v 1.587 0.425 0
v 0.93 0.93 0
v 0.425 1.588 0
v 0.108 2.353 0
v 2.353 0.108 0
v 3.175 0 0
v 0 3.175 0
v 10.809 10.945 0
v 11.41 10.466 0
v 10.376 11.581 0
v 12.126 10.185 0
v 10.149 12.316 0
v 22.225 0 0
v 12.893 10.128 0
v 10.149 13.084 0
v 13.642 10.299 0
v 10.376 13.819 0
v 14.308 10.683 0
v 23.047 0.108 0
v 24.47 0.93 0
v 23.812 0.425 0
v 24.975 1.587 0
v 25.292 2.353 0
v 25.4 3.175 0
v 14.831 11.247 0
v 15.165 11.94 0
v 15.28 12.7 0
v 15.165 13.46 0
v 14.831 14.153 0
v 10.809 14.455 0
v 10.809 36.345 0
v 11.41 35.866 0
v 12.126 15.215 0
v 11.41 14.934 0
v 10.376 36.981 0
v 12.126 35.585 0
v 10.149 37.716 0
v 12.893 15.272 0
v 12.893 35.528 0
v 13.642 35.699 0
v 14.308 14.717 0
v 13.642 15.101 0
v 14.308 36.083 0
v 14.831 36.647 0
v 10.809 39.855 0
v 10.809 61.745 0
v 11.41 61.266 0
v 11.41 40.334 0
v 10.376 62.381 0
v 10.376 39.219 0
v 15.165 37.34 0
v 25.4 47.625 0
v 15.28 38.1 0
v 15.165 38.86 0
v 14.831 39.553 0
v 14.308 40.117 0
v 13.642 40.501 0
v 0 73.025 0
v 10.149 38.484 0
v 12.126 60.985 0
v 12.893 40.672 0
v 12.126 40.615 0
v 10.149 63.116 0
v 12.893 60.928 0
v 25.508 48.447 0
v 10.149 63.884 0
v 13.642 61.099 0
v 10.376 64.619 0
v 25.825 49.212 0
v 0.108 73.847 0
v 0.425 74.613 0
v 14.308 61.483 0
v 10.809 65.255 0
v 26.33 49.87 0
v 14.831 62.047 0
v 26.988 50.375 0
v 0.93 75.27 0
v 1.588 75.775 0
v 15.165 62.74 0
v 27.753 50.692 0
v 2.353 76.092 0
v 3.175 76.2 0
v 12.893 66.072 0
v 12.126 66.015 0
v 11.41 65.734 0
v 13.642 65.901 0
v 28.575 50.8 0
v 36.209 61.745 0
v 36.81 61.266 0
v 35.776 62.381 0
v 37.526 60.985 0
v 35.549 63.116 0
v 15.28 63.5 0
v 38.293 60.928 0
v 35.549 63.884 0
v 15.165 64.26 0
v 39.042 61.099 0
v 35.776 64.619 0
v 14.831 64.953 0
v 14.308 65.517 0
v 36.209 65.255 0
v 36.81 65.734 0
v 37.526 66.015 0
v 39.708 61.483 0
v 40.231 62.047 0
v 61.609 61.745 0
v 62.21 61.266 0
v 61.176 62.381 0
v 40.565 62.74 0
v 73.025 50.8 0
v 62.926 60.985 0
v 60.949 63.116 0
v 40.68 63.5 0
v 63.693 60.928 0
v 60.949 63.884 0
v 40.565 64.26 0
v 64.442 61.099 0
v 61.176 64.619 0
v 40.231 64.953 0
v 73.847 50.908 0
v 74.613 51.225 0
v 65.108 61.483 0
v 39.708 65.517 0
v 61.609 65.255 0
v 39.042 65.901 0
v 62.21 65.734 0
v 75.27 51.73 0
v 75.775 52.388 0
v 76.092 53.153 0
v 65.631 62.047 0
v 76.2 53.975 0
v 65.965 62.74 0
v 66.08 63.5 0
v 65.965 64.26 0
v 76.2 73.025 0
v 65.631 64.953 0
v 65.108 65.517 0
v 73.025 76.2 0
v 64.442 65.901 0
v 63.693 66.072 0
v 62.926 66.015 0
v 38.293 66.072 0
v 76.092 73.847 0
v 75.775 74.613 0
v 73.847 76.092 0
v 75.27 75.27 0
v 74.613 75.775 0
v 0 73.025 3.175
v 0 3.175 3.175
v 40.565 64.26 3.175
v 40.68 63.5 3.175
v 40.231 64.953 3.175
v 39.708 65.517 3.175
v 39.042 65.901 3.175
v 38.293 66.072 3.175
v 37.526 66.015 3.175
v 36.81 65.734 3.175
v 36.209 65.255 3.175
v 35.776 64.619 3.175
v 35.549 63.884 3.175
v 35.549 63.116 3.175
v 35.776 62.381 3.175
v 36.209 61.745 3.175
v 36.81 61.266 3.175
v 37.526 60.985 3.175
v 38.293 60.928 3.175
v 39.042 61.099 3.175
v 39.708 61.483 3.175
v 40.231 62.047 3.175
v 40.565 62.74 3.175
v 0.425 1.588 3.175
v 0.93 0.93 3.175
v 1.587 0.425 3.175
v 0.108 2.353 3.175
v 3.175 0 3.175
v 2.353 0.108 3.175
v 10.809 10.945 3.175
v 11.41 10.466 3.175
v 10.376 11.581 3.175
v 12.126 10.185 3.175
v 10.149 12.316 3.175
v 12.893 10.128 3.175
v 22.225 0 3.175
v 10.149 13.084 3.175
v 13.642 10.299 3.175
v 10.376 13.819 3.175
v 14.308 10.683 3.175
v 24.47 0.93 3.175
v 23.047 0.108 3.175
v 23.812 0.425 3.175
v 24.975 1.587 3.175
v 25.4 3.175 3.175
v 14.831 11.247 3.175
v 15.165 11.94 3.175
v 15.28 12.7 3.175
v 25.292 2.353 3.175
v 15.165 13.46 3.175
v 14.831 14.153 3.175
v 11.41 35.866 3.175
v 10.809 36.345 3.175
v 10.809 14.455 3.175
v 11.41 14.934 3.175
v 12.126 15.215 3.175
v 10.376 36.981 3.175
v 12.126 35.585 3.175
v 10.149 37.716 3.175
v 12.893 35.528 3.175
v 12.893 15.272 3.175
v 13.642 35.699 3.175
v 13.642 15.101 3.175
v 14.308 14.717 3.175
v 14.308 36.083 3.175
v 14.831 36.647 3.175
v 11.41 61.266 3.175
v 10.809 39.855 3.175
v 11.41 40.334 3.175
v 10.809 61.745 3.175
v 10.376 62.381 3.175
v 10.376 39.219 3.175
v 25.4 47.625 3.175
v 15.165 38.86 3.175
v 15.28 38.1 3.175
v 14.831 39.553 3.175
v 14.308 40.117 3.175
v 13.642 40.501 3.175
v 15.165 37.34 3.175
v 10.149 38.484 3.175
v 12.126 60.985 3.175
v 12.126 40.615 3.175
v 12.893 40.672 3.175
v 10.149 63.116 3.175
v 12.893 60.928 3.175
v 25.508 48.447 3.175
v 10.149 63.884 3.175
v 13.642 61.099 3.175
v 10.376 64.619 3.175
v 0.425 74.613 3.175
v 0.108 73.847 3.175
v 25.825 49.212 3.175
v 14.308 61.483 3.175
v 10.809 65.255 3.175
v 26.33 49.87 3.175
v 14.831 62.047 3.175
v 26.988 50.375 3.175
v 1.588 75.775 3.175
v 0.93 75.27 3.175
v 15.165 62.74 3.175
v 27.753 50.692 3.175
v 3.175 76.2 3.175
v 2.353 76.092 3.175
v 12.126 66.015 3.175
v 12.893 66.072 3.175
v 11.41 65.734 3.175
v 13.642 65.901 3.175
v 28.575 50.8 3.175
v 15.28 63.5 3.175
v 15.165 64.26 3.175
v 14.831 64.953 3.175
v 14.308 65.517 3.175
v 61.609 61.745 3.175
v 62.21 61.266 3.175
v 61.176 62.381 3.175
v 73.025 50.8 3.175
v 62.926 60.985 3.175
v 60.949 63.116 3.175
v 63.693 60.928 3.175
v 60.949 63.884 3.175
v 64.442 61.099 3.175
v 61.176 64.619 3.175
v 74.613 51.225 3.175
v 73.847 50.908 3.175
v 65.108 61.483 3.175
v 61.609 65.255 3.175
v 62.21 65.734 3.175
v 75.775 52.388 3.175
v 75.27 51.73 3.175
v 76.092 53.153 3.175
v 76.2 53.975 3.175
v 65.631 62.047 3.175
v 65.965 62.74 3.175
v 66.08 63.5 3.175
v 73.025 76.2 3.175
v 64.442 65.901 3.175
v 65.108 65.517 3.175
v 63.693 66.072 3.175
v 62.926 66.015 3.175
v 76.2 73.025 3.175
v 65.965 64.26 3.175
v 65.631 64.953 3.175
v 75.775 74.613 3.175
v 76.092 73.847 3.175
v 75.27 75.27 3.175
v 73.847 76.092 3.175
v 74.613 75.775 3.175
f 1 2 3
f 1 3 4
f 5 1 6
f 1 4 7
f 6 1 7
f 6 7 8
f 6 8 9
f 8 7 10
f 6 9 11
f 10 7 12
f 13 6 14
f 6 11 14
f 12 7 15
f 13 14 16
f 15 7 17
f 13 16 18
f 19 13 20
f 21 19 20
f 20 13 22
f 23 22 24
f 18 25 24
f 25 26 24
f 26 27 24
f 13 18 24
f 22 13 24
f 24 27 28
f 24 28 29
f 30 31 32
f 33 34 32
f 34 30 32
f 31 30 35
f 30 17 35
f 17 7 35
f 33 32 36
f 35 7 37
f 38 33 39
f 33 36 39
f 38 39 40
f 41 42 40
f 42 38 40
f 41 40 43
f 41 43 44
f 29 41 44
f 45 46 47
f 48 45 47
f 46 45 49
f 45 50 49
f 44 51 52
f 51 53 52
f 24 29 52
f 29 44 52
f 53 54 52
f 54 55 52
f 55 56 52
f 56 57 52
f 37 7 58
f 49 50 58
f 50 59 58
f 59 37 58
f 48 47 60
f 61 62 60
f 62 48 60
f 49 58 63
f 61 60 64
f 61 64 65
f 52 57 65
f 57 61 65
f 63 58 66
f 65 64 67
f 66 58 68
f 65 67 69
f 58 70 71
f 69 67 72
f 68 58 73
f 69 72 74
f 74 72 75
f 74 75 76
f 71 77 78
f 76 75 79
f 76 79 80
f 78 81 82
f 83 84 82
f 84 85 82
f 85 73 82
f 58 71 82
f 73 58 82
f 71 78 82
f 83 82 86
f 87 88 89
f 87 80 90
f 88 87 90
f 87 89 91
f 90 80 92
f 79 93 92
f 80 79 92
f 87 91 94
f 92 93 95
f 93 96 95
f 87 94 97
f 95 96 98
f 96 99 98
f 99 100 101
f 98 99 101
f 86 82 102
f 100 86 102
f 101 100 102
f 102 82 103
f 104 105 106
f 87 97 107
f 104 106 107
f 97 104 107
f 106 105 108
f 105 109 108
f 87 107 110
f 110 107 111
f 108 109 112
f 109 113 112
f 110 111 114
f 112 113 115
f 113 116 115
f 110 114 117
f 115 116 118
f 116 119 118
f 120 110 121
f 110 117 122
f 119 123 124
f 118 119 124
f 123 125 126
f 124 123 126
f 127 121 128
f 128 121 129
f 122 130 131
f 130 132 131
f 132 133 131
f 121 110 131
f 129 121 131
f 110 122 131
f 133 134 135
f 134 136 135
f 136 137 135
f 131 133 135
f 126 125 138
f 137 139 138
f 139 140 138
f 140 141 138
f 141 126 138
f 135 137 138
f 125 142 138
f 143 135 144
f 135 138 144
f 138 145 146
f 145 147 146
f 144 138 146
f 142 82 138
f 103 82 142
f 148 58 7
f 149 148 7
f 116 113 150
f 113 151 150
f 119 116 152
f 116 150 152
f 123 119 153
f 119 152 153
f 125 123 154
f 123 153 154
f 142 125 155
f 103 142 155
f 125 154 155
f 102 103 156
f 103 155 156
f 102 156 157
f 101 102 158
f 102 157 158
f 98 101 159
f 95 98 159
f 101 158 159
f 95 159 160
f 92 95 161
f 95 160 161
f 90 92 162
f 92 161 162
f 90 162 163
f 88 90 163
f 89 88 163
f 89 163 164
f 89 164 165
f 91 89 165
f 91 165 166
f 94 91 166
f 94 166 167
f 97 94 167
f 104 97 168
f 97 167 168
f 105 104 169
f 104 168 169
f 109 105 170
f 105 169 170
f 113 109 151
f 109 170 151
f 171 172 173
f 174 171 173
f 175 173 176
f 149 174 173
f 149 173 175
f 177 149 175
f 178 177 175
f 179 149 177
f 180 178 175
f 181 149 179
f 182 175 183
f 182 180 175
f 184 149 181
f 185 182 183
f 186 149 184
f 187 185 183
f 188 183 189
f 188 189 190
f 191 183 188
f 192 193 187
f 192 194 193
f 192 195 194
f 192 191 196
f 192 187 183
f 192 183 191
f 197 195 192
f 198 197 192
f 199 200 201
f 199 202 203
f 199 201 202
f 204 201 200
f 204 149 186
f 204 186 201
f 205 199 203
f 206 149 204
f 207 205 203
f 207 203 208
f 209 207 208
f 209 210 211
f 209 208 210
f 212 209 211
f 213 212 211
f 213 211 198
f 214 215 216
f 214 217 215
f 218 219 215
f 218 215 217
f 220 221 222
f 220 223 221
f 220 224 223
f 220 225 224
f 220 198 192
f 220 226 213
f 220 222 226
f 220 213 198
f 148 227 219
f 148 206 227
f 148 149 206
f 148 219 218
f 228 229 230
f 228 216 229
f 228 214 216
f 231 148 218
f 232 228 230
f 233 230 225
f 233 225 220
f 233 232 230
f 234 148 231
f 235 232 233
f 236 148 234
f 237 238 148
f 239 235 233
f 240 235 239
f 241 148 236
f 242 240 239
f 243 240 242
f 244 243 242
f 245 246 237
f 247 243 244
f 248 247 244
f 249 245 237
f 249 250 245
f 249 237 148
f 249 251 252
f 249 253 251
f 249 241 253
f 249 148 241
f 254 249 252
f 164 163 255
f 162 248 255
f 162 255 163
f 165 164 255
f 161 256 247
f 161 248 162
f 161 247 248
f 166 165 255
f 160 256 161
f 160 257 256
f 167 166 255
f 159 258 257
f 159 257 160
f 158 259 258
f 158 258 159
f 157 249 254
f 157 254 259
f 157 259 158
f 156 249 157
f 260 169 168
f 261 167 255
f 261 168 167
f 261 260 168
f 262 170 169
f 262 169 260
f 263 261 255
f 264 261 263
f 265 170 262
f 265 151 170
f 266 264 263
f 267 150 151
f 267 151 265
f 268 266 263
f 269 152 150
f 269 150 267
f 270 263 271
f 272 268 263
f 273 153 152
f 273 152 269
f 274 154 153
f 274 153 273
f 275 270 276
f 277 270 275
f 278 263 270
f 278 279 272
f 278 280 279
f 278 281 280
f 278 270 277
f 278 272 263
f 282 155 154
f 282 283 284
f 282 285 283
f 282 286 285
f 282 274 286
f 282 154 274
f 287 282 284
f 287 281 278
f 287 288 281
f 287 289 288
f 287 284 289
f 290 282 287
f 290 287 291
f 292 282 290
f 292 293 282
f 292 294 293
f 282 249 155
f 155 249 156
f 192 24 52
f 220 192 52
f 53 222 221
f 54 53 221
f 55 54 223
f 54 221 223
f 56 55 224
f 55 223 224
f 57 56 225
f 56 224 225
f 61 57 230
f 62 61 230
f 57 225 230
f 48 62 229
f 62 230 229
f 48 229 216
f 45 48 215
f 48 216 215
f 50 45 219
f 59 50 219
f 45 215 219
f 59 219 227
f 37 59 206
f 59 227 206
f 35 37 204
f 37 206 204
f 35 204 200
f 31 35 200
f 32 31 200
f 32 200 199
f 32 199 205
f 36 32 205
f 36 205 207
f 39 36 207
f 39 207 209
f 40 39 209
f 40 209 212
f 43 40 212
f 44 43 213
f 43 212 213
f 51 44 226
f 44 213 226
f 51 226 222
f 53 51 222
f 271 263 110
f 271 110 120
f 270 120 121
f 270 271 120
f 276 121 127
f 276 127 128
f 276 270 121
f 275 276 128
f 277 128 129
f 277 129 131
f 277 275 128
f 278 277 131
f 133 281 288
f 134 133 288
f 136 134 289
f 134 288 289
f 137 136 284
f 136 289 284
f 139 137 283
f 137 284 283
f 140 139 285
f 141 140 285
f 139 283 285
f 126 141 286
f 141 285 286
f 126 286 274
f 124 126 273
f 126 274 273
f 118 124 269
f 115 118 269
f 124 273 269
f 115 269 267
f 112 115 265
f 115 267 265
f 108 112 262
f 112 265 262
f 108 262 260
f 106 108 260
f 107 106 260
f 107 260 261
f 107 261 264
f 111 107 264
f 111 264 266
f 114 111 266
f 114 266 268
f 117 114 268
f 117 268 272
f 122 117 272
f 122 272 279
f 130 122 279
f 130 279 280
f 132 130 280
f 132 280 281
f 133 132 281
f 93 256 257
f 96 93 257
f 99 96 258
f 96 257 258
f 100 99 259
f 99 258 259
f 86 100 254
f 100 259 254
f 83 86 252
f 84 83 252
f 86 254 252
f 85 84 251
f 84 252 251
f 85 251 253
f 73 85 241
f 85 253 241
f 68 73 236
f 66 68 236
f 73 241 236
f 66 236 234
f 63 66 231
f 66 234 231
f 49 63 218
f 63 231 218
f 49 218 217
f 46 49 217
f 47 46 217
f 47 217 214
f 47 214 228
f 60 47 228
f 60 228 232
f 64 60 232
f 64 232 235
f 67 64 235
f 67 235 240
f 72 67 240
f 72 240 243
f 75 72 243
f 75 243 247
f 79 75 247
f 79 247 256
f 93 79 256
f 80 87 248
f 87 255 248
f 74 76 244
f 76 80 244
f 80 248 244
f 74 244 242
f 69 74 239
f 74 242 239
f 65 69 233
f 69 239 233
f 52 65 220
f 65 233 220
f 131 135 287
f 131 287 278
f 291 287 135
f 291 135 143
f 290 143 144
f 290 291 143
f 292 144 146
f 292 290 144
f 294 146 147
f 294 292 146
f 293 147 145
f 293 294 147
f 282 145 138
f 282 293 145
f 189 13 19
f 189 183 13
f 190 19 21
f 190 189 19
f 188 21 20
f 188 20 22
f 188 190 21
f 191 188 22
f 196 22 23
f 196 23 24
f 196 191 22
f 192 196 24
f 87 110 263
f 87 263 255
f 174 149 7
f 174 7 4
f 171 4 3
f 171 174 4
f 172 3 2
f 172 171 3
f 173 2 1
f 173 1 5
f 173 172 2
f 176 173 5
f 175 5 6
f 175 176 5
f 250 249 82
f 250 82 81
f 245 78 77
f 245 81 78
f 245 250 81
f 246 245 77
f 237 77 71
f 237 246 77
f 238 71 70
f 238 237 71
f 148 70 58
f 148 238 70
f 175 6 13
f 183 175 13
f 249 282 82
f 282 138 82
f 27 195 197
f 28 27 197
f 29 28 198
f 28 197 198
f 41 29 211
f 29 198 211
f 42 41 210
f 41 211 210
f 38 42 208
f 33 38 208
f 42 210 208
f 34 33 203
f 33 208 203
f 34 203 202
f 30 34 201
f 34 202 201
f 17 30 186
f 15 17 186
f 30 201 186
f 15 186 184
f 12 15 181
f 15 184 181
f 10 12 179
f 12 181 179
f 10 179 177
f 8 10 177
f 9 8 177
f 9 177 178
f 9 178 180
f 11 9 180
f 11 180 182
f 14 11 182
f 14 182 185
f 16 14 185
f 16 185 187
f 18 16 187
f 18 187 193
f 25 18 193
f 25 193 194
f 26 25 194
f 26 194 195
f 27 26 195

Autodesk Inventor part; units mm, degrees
ref_plane "YZ Plane" through (0, 0, 0) normal (1, 0, 0) x (0, 1, 0)
ref_plane "XZ Plane" through (0, 0, 0) normal (0, 1, 0) x (-1, 0, 0)
ref_plane "XY Plane" through (0, 0, 0) normal (0, 0, 1) x (1, 0, 0)
sketch "Sketch1" plane through (0, 0, 0) normal (0, 0, 1) x (1, 0, 0)
  line L0 (0, 0) -> (25.4, 0)
  line L1 (25.4, 0) -> (25.4, 76.2)
  line L2 (25.4, 76.2) -> (0, 76.2)
  line L3 (0, 76.2) -> (0, 0)
  line L4 (0, 76.2) -> (76.2, 76.2)
  line L5 (76.2, 76.2) -> (76.2, 50.8)
  line L6 (76.2, 50.8) -> (0, 50.8)
  line L7 (0, 50.8) -> (0, 76.2)
  dimension "d0" = 25.4
  dimension "d1" = 76.2
  dimension "d2" = 76.2
  dimension "d3" = 25.4
extrude "Extrusion1" add sketch "Sketch1" along normal blind 3.175
sketch "Sketch2" plane through (0, 0, 3.175) normal (0, 0, 1) x (1, 0, 0)
  line L0 (0, 0) -> (25.4, 0) construction
  line L1 (12.7, 0) -> (12.7, 12.7) construction
  line L2 (12.7, 12.7) -> (12.7, 38.1) construction
  line L3 (12.7, 38.1) -> (12.7, 63.5) construction
  line L4 (12.7, 63.5) -> (38.1, 63.5) construction
  line L5 (38.1, 63.5) -> (63.5, 63.5) construction
  circle A0 centre (63.5, 63.5) radius 2.5797
  circle A1 centre (38.1, 63.5) radius 2.5797
  circle A2 centre (12.7, 63.5) radius 2.5797
  circle A3 centre (12.7, 38.1) radius 2.5797
  circle A4 centre (12.7, 12.7) radius 2.5797
  dimension "d6" = 12.7
  dimension "d7" = 25.4
  dimension "d8" = 25.4
  dimension "d11" = 25.4
  dimension "d12" = 25.4
  dimension "d13" = 5.1594
extrude "Extrusion2" cut sketch "Sketch2" against normal blind 3.175
fillet "Fillet1" radius 3.175 6 edges at (76.2, 76.2, 1.5875) (0, 76.2, 1.5875) (76.2, 50.8, 1.5875) (25.4, 50.8, 1.5875) (25.4, 0, 1.5875) (0, 0, 1.5875)
properties part number "0.125 L-Gusset"
